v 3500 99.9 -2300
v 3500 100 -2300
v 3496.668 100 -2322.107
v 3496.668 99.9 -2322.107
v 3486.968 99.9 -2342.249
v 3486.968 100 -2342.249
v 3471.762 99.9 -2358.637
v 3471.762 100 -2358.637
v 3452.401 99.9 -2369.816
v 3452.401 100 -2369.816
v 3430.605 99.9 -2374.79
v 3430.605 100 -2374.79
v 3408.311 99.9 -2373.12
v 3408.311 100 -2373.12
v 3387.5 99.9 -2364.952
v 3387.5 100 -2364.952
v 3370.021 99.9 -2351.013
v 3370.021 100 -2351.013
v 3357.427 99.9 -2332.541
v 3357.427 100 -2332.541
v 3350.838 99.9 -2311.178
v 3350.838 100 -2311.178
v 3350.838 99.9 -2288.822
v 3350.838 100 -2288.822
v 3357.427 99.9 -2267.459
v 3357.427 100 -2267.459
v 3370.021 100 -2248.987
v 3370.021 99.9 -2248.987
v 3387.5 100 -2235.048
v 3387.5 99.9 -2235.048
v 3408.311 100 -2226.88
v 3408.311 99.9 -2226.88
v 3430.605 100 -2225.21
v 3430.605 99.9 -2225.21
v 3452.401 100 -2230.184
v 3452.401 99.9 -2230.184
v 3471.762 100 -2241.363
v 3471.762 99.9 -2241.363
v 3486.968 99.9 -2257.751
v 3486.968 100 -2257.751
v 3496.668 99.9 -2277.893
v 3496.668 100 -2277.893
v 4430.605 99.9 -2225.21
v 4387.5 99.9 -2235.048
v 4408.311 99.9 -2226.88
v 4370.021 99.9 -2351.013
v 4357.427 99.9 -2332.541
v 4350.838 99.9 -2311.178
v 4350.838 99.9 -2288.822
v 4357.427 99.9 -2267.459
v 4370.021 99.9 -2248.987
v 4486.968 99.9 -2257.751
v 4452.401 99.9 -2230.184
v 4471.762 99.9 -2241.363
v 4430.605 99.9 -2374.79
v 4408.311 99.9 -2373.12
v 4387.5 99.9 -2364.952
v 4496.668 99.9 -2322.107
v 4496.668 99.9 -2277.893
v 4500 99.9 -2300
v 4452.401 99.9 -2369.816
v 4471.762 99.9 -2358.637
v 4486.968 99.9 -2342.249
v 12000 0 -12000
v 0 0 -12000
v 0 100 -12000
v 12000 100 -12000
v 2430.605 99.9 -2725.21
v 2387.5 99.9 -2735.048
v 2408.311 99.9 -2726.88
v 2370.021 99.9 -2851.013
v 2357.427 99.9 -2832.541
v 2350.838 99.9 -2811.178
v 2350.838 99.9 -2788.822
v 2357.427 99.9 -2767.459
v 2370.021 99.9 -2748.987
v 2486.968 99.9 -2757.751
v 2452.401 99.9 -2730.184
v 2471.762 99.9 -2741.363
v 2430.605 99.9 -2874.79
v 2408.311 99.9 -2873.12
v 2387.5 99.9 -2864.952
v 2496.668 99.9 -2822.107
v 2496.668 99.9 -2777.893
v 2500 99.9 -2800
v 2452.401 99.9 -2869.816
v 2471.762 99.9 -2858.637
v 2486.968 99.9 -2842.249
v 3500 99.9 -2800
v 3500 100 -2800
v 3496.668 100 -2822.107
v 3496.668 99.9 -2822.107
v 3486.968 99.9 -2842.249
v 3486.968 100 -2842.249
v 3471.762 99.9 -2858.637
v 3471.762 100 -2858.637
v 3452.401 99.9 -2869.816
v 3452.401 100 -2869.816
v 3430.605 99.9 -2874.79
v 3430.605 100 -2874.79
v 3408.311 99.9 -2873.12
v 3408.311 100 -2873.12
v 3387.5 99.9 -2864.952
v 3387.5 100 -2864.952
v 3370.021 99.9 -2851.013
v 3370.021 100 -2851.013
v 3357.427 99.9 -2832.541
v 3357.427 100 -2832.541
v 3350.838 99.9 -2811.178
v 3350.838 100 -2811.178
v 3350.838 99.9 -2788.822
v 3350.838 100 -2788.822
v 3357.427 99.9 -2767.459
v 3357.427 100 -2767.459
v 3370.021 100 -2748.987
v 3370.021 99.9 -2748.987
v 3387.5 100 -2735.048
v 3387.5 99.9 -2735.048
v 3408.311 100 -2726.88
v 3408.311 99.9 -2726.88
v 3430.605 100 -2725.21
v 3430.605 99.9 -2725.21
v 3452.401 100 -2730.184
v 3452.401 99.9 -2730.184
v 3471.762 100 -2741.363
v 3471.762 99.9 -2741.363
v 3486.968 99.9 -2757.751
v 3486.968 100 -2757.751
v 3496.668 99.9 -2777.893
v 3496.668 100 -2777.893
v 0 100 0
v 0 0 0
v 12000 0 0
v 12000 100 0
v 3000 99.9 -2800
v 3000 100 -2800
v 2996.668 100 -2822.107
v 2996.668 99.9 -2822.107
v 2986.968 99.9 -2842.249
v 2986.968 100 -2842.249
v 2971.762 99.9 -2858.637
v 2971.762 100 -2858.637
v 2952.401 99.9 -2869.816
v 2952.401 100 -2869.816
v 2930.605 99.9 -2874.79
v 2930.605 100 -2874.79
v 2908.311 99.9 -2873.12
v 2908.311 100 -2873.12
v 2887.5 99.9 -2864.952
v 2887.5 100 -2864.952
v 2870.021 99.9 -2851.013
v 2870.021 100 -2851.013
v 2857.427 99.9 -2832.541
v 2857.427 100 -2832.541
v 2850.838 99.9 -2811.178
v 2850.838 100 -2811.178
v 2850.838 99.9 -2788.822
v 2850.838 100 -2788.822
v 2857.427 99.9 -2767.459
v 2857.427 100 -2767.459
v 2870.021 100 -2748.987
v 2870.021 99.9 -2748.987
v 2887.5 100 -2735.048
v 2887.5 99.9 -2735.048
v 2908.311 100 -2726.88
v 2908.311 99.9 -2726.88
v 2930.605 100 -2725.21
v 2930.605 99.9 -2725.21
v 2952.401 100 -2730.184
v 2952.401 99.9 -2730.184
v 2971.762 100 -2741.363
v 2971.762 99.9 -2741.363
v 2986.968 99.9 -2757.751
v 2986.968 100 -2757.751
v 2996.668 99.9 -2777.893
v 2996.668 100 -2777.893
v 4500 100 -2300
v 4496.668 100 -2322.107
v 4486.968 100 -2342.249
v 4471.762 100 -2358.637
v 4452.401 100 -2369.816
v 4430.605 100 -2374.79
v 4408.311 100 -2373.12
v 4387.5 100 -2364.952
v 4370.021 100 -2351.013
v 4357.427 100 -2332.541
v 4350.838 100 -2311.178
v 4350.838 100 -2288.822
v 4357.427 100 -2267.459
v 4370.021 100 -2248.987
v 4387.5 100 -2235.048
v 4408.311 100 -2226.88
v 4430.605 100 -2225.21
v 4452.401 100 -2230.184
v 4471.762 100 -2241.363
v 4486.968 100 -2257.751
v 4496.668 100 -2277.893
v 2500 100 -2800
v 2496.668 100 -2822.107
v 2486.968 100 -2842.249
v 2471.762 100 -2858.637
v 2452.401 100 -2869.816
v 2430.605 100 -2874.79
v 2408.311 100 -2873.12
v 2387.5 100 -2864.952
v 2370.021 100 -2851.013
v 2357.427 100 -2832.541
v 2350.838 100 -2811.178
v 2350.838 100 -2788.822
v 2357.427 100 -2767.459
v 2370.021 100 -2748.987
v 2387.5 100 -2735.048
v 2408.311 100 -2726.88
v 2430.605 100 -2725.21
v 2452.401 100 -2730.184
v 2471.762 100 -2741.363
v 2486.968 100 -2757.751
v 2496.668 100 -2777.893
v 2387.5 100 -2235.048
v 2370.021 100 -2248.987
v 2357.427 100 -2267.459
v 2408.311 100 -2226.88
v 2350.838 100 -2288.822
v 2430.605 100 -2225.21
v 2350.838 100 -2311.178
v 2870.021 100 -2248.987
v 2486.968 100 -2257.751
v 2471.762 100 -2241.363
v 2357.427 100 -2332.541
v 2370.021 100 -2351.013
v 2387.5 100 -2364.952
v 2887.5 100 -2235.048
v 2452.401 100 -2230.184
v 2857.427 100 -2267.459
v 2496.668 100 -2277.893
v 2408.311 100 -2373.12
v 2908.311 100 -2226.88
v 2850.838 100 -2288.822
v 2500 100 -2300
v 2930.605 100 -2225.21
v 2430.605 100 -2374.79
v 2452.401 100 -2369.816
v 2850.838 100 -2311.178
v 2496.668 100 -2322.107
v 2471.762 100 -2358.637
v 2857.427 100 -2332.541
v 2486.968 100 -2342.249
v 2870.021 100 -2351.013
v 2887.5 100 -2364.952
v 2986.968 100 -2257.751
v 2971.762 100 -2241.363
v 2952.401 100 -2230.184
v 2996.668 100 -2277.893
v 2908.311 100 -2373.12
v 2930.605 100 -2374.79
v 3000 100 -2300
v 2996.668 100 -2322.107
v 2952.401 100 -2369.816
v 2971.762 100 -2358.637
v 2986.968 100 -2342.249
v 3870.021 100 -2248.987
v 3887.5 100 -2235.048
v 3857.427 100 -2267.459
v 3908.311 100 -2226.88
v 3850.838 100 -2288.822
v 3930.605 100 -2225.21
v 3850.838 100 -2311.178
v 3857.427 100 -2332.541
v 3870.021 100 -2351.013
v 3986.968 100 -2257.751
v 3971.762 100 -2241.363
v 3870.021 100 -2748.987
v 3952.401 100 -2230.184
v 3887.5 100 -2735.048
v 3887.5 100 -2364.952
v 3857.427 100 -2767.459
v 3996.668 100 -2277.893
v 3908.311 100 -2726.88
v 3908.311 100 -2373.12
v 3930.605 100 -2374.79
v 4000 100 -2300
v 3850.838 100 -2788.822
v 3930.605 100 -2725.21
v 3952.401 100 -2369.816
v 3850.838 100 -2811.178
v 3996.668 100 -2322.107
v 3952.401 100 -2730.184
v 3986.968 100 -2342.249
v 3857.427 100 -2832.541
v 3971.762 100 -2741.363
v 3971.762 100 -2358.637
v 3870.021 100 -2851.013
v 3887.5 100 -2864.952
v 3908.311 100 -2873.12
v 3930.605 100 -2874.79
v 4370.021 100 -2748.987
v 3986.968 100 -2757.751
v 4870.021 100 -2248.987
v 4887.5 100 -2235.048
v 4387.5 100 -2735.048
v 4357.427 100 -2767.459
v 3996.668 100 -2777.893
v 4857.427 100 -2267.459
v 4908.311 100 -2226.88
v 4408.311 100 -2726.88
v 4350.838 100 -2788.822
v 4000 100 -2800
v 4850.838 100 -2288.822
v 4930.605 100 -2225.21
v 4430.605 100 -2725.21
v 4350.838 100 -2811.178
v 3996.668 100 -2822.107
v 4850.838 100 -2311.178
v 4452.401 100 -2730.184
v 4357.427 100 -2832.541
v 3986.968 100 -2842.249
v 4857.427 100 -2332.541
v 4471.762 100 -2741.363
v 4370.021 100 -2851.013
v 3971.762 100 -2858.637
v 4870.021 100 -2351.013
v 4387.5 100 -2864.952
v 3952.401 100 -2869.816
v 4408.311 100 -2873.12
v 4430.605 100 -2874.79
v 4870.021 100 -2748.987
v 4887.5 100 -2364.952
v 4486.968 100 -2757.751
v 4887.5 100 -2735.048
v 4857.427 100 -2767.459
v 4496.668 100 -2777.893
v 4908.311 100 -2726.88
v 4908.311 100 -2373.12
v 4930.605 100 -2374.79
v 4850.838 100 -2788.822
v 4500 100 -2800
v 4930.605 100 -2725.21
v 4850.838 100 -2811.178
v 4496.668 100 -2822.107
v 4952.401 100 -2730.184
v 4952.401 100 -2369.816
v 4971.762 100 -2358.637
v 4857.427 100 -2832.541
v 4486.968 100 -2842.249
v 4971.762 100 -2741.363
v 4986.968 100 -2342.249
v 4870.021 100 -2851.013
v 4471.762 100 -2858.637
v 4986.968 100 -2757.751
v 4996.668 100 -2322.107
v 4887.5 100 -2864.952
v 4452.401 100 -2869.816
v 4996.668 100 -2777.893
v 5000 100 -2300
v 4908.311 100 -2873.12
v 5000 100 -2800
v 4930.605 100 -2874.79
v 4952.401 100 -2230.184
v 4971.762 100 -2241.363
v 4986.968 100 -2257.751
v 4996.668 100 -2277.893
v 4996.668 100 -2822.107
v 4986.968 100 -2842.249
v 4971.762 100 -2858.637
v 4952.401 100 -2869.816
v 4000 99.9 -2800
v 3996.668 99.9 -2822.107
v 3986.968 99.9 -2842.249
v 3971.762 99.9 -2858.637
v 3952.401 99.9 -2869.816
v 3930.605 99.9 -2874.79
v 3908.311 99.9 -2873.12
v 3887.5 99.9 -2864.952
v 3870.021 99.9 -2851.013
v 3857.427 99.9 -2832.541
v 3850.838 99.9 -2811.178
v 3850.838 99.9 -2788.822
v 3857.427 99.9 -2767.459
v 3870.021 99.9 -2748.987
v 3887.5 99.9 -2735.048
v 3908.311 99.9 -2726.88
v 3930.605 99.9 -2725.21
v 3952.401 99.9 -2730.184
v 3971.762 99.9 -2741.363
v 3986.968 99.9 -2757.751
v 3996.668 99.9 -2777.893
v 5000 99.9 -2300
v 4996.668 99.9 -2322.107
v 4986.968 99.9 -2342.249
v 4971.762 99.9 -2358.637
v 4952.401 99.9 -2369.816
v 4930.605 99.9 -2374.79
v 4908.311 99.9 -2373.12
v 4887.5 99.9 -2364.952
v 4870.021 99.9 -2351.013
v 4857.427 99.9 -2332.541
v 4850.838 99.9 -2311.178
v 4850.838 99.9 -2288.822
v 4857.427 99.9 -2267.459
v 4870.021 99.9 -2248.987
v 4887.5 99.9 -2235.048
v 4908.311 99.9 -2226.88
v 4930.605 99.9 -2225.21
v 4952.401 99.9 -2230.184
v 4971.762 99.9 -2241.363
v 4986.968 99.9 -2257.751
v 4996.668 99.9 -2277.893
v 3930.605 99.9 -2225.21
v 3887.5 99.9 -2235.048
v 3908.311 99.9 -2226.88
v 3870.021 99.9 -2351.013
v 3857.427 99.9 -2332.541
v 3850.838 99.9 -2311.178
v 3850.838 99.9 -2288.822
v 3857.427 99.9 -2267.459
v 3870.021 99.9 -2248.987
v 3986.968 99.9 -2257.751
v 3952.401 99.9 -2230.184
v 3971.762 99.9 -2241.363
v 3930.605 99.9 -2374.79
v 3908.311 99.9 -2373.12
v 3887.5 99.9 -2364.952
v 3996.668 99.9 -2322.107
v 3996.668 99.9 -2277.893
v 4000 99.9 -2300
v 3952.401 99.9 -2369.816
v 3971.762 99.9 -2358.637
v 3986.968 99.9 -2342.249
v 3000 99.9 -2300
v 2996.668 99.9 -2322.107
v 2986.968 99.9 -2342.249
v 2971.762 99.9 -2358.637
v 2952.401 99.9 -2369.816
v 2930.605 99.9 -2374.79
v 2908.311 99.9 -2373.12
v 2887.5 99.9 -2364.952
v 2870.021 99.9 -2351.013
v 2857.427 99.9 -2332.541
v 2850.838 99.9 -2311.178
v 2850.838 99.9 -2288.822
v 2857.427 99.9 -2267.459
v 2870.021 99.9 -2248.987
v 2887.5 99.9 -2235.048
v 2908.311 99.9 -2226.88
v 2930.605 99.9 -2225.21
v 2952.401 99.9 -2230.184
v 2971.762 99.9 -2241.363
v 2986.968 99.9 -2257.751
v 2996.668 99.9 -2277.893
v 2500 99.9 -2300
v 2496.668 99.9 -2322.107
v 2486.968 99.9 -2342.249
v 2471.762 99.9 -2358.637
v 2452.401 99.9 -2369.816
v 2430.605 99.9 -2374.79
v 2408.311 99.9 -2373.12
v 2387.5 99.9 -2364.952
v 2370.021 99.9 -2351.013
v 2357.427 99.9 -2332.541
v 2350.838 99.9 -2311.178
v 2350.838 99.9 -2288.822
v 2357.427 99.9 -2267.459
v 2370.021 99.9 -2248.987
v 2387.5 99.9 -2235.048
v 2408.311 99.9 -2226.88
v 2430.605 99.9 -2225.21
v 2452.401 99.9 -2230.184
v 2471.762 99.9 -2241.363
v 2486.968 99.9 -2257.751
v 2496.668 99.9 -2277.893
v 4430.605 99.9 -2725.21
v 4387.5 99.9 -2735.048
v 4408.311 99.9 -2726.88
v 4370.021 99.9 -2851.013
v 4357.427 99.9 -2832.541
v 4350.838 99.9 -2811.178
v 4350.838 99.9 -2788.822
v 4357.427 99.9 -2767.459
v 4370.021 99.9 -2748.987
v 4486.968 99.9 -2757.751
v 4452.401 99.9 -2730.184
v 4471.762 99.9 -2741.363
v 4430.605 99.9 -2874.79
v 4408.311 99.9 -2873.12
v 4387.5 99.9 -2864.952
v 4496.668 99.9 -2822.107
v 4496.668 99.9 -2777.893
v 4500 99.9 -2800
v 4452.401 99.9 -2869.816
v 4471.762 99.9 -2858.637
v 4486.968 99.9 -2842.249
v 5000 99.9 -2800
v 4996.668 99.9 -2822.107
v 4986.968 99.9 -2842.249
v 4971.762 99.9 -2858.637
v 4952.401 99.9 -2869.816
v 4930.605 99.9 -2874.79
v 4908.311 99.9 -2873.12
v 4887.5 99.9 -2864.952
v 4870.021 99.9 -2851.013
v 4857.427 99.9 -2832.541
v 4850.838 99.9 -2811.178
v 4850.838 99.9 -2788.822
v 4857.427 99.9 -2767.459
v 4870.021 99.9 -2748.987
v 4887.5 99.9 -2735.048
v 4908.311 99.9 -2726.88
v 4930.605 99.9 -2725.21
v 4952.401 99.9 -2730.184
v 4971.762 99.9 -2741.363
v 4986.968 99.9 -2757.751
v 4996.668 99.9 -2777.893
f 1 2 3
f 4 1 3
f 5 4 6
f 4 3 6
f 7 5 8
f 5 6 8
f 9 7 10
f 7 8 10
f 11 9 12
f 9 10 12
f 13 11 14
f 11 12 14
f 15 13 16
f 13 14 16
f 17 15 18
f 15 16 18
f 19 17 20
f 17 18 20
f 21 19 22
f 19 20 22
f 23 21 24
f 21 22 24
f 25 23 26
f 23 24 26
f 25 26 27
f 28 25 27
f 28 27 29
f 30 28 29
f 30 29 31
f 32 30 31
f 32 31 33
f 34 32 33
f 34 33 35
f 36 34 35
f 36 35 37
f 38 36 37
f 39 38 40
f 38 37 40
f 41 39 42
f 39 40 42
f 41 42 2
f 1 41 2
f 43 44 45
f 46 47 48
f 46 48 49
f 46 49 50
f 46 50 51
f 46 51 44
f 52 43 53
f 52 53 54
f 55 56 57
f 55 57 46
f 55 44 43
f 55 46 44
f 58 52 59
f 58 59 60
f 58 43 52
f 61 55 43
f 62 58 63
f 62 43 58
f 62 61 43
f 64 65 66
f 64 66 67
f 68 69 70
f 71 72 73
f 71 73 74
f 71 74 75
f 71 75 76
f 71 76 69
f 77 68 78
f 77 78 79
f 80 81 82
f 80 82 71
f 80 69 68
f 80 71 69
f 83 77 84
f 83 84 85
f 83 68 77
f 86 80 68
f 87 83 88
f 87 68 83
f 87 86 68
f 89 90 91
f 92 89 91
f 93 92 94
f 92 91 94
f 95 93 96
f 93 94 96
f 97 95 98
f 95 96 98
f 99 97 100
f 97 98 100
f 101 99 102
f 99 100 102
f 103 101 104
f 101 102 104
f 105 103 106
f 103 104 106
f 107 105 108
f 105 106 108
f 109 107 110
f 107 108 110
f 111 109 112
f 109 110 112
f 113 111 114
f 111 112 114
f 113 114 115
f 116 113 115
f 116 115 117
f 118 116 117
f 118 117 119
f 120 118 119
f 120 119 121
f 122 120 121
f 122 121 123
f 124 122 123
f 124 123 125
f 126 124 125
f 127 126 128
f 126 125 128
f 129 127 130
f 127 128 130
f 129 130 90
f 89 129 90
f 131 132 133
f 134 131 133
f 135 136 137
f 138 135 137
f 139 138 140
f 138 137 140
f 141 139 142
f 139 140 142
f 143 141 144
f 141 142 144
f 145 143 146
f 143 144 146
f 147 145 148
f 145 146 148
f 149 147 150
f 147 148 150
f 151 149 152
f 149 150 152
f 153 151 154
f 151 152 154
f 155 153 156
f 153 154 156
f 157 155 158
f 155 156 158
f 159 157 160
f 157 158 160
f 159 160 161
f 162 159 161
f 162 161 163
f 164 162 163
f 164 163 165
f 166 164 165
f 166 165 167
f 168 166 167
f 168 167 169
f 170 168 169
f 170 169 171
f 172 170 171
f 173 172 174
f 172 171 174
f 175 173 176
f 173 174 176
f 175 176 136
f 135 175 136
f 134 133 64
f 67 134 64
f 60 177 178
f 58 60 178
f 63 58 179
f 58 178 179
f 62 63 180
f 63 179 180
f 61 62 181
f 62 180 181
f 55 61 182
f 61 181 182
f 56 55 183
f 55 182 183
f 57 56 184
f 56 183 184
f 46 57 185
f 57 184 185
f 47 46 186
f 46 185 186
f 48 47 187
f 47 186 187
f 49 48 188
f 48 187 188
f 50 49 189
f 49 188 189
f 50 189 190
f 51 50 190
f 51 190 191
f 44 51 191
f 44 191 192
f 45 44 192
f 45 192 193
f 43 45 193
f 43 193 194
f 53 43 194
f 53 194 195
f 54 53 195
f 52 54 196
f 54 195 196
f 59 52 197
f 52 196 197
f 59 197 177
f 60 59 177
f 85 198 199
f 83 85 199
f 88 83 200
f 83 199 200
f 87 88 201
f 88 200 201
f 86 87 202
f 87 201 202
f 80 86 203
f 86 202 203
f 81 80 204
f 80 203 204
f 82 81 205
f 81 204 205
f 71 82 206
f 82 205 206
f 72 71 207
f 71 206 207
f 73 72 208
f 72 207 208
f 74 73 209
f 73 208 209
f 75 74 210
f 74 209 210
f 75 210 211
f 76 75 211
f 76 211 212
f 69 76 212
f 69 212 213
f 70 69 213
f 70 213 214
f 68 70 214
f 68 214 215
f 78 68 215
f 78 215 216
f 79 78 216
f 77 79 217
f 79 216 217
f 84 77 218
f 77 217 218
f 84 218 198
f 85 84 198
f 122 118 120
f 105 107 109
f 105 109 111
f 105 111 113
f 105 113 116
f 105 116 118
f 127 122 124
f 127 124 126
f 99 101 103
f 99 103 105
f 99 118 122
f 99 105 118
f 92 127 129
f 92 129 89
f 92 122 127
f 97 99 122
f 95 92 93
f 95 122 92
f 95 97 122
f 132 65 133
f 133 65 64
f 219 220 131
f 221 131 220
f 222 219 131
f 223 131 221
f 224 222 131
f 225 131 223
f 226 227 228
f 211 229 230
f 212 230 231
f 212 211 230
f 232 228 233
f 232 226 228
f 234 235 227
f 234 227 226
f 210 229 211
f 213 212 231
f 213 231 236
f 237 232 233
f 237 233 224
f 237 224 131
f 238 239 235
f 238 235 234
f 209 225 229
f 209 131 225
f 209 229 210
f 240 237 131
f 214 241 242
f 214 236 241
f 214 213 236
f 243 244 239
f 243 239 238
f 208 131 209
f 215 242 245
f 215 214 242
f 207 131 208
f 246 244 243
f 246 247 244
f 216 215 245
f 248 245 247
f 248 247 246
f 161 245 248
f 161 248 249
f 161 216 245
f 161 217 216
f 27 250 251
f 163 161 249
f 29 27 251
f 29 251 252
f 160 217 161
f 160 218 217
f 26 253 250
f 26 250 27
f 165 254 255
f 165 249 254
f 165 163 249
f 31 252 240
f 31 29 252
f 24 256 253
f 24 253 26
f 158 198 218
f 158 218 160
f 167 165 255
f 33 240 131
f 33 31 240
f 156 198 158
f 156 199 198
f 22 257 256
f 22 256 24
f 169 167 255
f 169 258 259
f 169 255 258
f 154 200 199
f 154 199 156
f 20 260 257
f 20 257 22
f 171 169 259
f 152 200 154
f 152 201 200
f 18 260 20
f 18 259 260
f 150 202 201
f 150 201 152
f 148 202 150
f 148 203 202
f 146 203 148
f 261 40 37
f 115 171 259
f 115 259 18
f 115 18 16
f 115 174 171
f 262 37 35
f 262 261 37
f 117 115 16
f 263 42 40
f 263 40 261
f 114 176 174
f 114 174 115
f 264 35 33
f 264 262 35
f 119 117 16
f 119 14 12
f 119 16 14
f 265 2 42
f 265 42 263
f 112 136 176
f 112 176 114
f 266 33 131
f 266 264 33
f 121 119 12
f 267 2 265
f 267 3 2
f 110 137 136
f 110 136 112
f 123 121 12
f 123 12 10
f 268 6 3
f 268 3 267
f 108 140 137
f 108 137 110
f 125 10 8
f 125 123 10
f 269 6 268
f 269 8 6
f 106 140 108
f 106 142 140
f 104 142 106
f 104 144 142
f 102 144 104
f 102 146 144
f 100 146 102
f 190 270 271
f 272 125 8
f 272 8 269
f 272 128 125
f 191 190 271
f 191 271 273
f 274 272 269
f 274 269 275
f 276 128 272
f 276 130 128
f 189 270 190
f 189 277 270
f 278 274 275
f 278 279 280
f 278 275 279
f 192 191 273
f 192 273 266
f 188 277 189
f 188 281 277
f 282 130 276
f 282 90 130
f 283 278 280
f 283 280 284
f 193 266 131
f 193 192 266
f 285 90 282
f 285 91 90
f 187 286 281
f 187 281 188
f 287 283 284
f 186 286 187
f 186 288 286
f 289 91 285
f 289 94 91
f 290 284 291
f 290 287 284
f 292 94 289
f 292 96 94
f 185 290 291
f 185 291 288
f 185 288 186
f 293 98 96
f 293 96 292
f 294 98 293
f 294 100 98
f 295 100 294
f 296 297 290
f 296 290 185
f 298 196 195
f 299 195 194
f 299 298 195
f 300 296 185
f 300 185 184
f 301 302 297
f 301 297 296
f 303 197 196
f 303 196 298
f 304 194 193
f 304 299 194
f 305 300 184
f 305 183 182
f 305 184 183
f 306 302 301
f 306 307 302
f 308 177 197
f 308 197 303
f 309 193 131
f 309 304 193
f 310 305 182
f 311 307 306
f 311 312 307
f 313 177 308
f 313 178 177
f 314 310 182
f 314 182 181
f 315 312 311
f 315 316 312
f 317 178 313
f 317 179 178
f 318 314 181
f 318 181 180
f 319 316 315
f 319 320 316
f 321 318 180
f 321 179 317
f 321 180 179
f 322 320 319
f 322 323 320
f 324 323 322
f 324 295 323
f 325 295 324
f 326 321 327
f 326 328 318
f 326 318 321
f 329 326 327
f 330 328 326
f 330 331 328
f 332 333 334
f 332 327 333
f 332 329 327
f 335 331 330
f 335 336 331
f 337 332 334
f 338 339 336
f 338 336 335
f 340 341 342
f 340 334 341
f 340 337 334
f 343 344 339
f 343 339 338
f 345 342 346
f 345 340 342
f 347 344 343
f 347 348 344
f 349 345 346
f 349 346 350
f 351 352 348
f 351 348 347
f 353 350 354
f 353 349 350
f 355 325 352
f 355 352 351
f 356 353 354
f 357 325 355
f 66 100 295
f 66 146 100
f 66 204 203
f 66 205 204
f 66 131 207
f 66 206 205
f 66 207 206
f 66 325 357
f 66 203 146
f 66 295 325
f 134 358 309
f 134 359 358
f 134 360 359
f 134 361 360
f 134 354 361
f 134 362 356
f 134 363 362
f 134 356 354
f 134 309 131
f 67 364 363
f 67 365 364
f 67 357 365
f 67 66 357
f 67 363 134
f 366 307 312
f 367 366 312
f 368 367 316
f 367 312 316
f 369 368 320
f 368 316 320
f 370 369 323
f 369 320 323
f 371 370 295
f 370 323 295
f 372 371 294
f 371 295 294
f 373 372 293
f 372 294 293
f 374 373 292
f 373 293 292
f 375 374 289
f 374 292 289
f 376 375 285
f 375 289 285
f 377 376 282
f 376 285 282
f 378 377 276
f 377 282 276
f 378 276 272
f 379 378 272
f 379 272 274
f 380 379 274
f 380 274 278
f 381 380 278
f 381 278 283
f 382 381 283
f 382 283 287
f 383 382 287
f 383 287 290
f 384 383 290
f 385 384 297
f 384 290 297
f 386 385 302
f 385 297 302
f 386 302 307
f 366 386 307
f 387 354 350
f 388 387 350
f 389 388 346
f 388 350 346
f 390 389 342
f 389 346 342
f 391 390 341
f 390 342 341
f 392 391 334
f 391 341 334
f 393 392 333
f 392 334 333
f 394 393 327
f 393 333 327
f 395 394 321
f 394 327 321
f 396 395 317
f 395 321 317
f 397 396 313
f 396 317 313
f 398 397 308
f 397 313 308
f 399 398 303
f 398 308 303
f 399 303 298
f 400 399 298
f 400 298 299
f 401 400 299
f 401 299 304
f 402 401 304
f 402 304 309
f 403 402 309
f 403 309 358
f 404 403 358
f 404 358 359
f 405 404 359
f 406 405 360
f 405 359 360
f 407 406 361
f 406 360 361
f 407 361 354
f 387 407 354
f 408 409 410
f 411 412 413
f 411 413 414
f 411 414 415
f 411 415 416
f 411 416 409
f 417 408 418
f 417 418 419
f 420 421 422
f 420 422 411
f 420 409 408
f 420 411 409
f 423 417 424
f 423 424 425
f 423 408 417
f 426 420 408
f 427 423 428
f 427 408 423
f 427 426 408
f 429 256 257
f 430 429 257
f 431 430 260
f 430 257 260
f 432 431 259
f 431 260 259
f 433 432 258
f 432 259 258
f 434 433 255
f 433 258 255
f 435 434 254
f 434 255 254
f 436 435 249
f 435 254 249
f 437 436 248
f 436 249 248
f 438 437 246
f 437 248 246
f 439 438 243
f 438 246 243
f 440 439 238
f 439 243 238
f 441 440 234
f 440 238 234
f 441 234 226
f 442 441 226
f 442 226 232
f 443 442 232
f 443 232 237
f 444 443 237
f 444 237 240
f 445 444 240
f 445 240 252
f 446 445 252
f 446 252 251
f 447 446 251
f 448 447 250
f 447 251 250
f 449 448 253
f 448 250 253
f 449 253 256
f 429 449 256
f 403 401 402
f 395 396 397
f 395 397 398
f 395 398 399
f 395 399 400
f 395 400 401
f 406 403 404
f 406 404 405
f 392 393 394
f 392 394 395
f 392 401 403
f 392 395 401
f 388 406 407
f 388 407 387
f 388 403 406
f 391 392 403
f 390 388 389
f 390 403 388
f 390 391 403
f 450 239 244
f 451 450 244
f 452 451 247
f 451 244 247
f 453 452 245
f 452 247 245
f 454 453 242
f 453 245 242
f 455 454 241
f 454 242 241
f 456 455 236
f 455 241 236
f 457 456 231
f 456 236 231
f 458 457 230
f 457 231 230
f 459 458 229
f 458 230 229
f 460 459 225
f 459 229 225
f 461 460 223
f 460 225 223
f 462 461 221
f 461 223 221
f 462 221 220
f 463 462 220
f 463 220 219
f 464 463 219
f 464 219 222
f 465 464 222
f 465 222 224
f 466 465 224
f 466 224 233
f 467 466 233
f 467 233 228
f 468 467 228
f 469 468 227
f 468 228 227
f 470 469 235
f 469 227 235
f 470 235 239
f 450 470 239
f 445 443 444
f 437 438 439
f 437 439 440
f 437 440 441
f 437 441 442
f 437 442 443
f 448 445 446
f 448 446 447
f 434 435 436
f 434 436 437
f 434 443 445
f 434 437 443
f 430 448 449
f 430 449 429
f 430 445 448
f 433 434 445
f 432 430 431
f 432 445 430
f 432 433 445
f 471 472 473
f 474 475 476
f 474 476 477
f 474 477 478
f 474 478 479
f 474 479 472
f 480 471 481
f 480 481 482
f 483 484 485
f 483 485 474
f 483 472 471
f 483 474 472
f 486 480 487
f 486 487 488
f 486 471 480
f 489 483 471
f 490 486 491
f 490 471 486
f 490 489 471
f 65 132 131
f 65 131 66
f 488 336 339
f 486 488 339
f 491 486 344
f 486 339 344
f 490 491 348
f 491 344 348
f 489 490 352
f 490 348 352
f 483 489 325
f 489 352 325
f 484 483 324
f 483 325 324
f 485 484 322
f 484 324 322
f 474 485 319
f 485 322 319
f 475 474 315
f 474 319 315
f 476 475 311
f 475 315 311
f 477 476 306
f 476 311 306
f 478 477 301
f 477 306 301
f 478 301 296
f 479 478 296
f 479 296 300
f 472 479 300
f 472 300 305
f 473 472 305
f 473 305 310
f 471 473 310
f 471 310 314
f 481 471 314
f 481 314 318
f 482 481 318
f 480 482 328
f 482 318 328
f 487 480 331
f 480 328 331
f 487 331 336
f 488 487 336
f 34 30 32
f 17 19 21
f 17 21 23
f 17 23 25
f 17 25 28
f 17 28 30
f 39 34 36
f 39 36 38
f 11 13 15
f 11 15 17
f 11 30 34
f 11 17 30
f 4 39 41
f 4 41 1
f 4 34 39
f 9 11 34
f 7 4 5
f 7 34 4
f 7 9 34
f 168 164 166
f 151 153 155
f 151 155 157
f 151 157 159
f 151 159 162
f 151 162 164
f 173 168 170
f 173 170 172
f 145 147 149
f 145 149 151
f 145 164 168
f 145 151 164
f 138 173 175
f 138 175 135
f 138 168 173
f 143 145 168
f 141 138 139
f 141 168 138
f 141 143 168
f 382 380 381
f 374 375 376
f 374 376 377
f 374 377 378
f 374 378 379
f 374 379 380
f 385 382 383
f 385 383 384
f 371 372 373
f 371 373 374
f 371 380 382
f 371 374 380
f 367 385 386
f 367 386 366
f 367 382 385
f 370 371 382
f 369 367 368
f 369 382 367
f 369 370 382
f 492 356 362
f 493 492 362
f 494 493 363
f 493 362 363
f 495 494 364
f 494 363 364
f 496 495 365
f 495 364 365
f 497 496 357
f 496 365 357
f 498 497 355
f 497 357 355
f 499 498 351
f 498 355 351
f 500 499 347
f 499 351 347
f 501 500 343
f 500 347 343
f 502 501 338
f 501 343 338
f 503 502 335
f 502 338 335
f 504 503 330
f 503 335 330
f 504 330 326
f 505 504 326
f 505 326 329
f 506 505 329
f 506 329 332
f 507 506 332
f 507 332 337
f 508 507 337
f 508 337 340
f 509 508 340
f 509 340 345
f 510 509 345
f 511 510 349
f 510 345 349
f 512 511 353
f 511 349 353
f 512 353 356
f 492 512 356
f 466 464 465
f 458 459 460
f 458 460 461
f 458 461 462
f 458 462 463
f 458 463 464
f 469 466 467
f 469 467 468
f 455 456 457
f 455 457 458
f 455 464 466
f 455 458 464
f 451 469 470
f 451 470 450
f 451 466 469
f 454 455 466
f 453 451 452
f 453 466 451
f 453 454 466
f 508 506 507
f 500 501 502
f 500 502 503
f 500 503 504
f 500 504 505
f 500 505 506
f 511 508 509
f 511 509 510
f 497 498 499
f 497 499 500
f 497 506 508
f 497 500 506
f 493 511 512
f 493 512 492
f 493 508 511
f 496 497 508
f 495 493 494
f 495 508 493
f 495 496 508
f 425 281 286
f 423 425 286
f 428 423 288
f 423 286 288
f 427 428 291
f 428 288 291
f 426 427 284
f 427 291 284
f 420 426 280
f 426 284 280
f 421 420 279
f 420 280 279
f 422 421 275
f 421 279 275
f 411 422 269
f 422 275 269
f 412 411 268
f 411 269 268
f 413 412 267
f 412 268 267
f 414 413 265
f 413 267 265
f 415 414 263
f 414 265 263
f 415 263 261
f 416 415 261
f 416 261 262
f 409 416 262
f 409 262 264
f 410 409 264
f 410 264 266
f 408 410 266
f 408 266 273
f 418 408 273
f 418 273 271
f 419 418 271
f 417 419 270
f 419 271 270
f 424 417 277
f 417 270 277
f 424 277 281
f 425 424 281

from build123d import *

# Parameters (mm, degrees)
SKETCH1_W           = 12000
SKETCH1_H           = 12000
BOSS_EXTRUDE1_DEPTH = 100
SKETCH5_R           = 75
CUT_EXTRUDE2_DEPTH  = 0.1


with BuildPart() as part:
    # Sketch1 → Boss-Extrude1 (new body)
    with BuildSketch(Plane(origin=(0, 0, 0), x_dir=(1, 0, 0), z_dir=(0, 1, 0))):
        with Locations((6000, 6000)):
            Rectangle(SKETCH1_W, SKETCH1_H)
    extrude(amount=BOSS_EXTRUDE1_DEPTH)

    # Sketch5 → Cut-Extrude2 (cut)
    with BuildSketch(Plane(origin=(0, 100, 0), x_dir=(1, 0, 0), z_dir=(0, 1, 0))):
        with Locations((2425, 2800)):
            Circle(SKETCH5_R)
        with Locations((2425, 2300)):
            Circle(SKETCH5_R)
        with Locations((2925, 2300)):
            Circle(SKETCH5_R)
        with Locations((3425, 2300)):
            Circle(SKETCH5_R)
        with Locations((3925, 2300)):
            Circle(SKETCH5_R)
        with Locations((4425, 2300)):
            Circle(SKETCH5_R)
        with Locations((4925, 2300)):
            Circle(SKETCH5_R)
        with Locations((2925, 2800)):
            Circle(SKETCH5_R)
        with Locations((3425, 2800)):
            Circle(SKETCH5_R)
        with Locations((3925, 2800)):
            Circle(SKETCH5_R)
        with Locations((4425, 2800)):
            Circle(SKETCH5_R)
        with Locations((4925, 2800)):
            Circle(SKETCH5_R)
    extrude(amount=-CUT_EXTRUDE2_DEPTH, mode=Mode.SUBTRACT)


solid = part.part
